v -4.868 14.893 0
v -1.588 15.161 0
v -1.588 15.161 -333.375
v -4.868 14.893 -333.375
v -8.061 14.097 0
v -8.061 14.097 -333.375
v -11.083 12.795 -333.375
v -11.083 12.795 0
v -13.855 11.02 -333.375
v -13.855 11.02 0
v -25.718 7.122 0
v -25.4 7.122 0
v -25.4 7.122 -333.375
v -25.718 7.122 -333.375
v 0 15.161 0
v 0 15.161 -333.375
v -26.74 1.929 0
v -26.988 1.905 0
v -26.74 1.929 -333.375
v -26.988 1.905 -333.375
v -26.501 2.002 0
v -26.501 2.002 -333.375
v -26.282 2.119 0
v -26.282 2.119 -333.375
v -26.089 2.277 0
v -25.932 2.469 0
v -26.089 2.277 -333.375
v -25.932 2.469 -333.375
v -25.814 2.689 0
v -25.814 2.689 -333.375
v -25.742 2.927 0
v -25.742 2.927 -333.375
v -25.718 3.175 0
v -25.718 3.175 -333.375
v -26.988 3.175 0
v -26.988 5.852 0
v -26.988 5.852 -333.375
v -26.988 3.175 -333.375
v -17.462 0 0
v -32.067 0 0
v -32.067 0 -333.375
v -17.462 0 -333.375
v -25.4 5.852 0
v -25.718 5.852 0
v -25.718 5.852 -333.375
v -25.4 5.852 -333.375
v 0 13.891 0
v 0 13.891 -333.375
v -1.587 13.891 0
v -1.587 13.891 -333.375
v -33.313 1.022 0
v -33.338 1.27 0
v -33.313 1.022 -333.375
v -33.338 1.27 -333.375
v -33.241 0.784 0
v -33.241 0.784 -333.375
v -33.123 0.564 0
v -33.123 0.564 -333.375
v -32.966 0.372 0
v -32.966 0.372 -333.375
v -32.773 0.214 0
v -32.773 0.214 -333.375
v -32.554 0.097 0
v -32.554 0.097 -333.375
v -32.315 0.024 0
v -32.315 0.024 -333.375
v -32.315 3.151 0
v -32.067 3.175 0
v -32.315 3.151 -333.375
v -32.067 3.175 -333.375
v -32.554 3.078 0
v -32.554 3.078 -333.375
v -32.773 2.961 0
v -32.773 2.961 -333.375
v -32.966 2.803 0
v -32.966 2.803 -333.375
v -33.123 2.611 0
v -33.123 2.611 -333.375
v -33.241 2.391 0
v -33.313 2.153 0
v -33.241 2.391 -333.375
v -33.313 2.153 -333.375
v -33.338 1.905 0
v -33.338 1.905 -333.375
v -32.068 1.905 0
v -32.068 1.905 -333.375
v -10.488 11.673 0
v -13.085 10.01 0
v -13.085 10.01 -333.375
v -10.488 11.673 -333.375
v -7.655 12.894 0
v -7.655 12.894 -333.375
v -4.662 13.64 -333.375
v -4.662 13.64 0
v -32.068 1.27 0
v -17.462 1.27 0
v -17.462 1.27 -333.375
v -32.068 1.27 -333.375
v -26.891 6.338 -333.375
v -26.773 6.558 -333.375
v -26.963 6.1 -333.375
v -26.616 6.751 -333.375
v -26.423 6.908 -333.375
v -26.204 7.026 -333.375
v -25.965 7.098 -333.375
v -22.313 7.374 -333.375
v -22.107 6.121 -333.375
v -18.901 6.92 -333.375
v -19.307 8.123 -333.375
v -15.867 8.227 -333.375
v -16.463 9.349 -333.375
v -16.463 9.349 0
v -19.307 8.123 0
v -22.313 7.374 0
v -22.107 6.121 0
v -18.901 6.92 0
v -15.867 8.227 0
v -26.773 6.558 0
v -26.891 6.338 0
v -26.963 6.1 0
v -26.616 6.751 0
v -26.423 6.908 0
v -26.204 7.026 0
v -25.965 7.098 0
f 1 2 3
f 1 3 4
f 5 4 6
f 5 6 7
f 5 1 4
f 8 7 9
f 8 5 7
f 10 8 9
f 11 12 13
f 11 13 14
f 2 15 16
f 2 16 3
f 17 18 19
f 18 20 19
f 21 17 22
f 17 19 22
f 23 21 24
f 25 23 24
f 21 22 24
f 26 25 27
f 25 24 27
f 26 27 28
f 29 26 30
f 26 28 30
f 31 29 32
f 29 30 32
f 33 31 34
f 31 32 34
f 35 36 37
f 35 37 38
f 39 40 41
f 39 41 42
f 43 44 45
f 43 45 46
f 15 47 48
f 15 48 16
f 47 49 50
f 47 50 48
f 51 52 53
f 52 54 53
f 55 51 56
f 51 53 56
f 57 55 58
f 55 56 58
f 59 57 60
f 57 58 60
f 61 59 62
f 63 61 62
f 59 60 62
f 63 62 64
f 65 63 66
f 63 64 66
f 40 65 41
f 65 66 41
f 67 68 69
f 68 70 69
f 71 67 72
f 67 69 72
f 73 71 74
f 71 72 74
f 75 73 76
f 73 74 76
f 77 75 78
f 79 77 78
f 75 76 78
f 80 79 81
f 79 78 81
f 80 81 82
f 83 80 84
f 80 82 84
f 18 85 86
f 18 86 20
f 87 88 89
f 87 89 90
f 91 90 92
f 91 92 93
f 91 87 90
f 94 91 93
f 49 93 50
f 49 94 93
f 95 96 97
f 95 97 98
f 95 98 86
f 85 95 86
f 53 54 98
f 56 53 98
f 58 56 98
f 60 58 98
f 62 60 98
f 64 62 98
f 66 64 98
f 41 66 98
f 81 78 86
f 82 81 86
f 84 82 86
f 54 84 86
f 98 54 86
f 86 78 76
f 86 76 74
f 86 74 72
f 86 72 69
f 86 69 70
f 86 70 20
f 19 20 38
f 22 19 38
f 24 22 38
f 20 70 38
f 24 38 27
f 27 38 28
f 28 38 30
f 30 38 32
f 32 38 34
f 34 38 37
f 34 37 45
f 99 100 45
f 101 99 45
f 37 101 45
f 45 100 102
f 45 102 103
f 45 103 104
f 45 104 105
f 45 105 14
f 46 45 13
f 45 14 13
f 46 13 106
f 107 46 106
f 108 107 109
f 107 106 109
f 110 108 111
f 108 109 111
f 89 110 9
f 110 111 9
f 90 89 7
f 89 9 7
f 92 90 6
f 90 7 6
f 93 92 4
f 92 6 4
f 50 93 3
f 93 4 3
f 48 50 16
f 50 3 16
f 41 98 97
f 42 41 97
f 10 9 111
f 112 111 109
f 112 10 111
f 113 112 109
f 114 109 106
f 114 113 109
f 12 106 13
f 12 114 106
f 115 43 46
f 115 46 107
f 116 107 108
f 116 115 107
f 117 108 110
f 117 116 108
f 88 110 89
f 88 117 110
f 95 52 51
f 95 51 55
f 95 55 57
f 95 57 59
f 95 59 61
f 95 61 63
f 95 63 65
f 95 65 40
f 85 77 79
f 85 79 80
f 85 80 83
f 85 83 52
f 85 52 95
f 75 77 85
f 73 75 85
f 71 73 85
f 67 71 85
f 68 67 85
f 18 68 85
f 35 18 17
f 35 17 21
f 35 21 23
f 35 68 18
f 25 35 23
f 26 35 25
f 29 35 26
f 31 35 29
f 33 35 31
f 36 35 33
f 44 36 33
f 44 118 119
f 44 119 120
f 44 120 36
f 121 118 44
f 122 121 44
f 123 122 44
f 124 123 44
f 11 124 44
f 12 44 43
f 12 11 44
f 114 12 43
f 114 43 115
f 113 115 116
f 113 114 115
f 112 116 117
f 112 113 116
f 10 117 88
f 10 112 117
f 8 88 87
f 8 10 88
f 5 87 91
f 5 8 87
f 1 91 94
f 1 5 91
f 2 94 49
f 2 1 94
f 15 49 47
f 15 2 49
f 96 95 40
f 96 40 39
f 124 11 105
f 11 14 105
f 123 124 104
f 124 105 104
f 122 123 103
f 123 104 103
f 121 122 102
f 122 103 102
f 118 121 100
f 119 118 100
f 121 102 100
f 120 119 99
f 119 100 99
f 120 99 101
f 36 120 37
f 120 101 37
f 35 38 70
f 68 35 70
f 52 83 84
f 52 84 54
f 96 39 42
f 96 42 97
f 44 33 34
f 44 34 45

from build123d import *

# Parameters (mm, degrees)
EXTRUDE_THIN1_DEPTH = 333.375
FILLET1_R           = 1.27


with BuildPart() as part:
    # Sketch1 → Extrude-Thin1 (new body)
    with BuildSketch(Plane.XY):
        with BuildLine():
            Line((0, 15.160625), (-1.5875, 15.160625))
            ThreePointArc((-1.5875, 15.160625), (-8.061044421, 14.097490008), (-13.854545455, 11.019766961))
            ThreePointArc((-13.854545455, 11.019766961), (-19.30725231, 8.123086446), (-25.4, 7.122488807))
            Line((-25.4, 7.122488807), (-26.9875, 7.122488807))
            Line((-26.9875, 7.122488807), (-26.9875, 3.175))
            Line((-26.9875, 3.175), (-33.3375, 3.175))
            Line((-33.3375, 3.175), (-33.3375, 0))
            Line((-33.3375, 0), (-17.4625, 0))
            Line((-17.4625, 0), (-17.4625, 1.27))
            Line((-17.4625, 1.27), (-32.0675, 1.27))
            Line((-32.0675, 1.27), (-32.0675, 1.905))
            Line((-32.0675, 1.905), (-25.7175, 1.905))
            Line((-25.7175, 1.905), (-25.7175, 5.852488807))
            Line((-25.7175, 5.852488807), (-25.4, 5.852488807))
            ThreePointArc((-25.4, 5.852488807), (-18.90106913, 6.919792956), (-13.084848485, 10.009585505))
            ThreePointArc((-13.084848485, 10.009585505), (-7.654861242, 12.894196518), (-1.5875, 13.890625))
            Line((-1.5875, 13.890625), (0, 13.890625))
            Line((0, 13.890625), (0, 15.160625))
        make_face()
    extrude(amount=-EXTRUDE_THIN1_DEPTH)

    # Fillet1
    fillet1_edges = [part.edges().sort_by_distance(p)[0] for p in [
        (-33.3375, 0, -166.6875),
        (-33.3375, 3.175, -166.6875),
        (-26.9875, 7.122488807, -166.6875),
        (-25.7175, 1.905, -166.6875),
    ]]
    fillet(fillet1_edges, radius=FILLET1_R)


solid = part.part
